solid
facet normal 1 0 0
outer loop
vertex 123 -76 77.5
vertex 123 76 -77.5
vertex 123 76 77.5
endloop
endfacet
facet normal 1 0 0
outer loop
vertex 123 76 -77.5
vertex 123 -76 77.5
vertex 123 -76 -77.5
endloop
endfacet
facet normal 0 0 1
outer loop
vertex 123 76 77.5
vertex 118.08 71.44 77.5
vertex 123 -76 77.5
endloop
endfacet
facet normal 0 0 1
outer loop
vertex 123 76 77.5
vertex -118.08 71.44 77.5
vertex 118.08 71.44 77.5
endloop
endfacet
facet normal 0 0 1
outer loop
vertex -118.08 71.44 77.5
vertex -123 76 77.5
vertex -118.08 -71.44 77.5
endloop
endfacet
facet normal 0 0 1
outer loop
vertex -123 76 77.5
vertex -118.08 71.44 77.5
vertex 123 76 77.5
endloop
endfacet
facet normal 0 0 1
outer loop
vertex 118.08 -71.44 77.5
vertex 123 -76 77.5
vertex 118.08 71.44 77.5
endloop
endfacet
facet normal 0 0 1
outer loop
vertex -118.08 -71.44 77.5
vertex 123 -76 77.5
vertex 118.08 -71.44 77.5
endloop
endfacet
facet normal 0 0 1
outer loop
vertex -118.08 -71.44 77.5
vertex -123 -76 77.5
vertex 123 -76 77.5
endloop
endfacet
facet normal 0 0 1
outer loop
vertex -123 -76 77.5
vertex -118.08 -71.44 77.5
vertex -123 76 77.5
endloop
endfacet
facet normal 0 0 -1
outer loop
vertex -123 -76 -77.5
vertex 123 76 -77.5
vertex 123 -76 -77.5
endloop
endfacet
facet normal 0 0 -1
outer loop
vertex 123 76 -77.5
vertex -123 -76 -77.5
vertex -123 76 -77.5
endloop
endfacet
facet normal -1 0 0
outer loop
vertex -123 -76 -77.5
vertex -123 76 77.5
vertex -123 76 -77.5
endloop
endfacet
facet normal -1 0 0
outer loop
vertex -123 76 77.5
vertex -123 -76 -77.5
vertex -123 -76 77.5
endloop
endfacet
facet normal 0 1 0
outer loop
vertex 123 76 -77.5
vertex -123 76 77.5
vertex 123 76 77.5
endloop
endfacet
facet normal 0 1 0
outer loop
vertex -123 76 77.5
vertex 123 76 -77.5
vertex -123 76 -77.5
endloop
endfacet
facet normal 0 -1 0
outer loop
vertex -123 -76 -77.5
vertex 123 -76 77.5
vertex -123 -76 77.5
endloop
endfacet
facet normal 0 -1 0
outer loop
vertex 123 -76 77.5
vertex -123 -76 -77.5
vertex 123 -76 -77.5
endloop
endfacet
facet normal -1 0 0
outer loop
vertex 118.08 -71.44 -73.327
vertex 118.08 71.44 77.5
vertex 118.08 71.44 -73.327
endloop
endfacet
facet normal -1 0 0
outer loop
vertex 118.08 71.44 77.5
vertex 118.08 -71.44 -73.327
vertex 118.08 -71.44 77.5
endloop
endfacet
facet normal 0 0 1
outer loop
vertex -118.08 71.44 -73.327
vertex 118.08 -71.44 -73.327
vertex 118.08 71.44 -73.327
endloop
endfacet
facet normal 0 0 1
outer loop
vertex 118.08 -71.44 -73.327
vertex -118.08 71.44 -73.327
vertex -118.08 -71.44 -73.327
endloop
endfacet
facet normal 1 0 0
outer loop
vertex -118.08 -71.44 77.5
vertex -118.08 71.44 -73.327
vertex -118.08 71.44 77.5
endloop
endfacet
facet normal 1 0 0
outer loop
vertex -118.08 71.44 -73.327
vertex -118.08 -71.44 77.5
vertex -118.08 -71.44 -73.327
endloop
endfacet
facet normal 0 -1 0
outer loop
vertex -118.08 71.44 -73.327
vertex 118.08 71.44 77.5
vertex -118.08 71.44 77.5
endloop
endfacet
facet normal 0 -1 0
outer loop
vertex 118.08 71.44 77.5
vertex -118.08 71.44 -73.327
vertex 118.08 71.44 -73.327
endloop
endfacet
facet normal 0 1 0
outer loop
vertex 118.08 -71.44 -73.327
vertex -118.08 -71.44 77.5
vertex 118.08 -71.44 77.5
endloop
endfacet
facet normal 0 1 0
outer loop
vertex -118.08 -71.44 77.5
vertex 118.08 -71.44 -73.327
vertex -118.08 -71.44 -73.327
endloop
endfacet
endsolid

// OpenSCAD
// file: 3dprinter.scad
//===============================================//
//===============================================//
//     BioDeploy SCAD file = 3dprinter.scad      //
//                 Start File                    //
//===============================================//
//===============================================//
//choose the max specs for your 3d printer
//here we use a replicator2x specs
x_print_max = 24.6*10;
y_print_max = 15.2*10;
z_print_max = 15.5*10;
//don't forget *10 to put unit in centimeters
//-----------------------------------------------//
//===============================================//
//===============================================//
//     BioDeploy SCAD file = 3dprinter.scad      //
//                   End  File                   //
//===============================================//
//===============================================//
// main file
//===============================================//
//===============================================//
//  BioDeploy SCAD file = hydrolyseur_box.scad   //
//                 Start File                    //
//===============================================//
//===============================================//
//-----------------------------------------------//

//===============================================//
//                   variables                   //
//===============================================//
include <hydrolyseur_variables.scad>
//===============================================//
//               Calls for use                   //
//===============================================//
//use <hydrolyseur_logo.scad>
//===============================================//
//                    Trees                      //
//===============================================//
module box()
{
  difference()
	{
	cube([x_h2o_box_ext,y_h2o_box_ext,z_h2o_box_ext], center = true);

	translate([0,0,z_h2o_box_int_move]) cube([x_h2o_box_int_difference,y_h2o_box_int_difference,z_h2o_box_int_difference], center = true);
	}}
box();


//%cube([x_h2o_cont_ext,y_h2o_cont_ext,z_h2o_cont_ext], center=true);
//-----------------------------------------------//
//===============================================//
//===============================================//
//  BioDeploy SCAD file = hydrolyseur_box.scad   //
//                   End  File                   //
//===============================================//
//===============================================//
